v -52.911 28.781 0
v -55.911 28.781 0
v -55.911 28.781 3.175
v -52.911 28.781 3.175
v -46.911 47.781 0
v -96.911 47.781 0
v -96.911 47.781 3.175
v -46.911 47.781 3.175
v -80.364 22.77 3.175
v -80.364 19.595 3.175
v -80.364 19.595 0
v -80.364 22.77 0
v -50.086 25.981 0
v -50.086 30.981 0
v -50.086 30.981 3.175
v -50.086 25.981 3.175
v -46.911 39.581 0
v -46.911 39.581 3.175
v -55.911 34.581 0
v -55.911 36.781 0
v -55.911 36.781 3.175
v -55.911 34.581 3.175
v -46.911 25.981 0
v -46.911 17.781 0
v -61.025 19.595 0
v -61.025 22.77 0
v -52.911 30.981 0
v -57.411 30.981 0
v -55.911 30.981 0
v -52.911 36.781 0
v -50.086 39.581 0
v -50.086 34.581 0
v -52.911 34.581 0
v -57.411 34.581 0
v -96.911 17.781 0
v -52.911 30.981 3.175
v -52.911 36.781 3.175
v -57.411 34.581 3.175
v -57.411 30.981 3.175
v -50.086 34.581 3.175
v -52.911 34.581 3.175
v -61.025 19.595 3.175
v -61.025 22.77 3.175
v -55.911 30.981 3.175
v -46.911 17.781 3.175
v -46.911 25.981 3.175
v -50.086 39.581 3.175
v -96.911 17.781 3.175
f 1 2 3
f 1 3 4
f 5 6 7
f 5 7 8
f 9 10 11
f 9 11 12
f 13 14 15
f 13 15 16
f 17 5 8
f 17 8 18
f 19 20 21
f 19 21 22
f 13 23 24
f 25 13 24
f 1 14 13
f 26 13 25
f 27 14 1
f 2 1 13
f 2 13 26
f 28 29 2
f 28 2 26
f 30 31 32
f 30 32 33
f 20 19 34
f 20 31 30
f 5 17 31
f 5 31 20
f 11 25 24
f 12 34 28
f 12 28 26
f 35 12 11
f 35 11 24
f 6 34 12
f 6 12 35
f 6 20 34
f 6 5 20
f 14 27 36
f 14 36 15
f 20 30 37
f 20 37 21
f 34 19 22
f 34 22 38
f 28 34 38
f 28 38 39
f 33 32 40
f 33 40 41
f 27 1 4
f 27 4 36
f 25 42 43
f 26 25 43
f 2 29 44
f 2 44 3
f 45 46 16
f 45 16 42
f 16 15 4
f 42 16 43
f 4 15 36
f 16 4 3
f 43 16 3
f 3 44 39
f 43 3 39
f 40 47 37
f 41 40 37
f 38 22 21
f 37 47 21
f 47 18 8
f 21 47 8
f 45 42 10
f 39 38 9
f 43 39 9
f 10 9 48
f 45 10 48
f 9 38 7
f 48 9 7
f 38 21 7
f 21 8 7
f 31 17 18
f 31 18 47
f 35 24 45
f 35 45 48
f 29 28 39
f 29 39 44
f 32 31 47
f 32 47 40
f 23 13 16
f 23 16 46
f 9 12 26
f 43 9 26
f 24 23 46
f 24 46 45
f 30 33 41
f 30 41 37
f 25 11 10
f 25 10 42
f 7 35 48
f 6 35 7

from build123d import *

# Parameters (mm, degrees)
SKETCH1_W           = 19.338503776
SKETCH1_H           = 3.175
BOSS_EXTRUDE1_DEPTH = 3.175


with BuildPart() as part:
    # Sketch1 → Boss-Extrude1 (new body)
    with BuildSketch(Plane.XY):
        Polygon((-96.911258203, 47.780766243), (-46.911258203, 47.780766243), (-46.911258203, 39.580766243), (-50.086258203, 39.580766243), (-50.086258203, 34.580766243), (-52.911258203, 34.580766243), (-52.911258203, 36.780766243), (-55.911258203, 36.780766243), (-55.911258203, 34.580766243), (-57.411258203, 34.580766243), (-57.411258203, 30.980766243), (-55.911258203, 30.980766243), (-55.911258203, 28.780766243), (-52.911258203, 28.780766243), (-52.911258203, 30.980766243), (-50.086258203, 30.980766243), (-50.086258203, 25.980766243), (-46.911258203, 25.980766243), (-46.911258203, 17.780766243), (-96.911258203, 17.780766243), align=None)
        with Locations((-70.694345596, 21.182701237)):
            Rectangle(SKETCH1_W, SKETCH1_H, mode=Mode.SUBTRACT)
    extrude(amount=BOSS_EXTRUDE1_DEPTH)


solid = part.part
